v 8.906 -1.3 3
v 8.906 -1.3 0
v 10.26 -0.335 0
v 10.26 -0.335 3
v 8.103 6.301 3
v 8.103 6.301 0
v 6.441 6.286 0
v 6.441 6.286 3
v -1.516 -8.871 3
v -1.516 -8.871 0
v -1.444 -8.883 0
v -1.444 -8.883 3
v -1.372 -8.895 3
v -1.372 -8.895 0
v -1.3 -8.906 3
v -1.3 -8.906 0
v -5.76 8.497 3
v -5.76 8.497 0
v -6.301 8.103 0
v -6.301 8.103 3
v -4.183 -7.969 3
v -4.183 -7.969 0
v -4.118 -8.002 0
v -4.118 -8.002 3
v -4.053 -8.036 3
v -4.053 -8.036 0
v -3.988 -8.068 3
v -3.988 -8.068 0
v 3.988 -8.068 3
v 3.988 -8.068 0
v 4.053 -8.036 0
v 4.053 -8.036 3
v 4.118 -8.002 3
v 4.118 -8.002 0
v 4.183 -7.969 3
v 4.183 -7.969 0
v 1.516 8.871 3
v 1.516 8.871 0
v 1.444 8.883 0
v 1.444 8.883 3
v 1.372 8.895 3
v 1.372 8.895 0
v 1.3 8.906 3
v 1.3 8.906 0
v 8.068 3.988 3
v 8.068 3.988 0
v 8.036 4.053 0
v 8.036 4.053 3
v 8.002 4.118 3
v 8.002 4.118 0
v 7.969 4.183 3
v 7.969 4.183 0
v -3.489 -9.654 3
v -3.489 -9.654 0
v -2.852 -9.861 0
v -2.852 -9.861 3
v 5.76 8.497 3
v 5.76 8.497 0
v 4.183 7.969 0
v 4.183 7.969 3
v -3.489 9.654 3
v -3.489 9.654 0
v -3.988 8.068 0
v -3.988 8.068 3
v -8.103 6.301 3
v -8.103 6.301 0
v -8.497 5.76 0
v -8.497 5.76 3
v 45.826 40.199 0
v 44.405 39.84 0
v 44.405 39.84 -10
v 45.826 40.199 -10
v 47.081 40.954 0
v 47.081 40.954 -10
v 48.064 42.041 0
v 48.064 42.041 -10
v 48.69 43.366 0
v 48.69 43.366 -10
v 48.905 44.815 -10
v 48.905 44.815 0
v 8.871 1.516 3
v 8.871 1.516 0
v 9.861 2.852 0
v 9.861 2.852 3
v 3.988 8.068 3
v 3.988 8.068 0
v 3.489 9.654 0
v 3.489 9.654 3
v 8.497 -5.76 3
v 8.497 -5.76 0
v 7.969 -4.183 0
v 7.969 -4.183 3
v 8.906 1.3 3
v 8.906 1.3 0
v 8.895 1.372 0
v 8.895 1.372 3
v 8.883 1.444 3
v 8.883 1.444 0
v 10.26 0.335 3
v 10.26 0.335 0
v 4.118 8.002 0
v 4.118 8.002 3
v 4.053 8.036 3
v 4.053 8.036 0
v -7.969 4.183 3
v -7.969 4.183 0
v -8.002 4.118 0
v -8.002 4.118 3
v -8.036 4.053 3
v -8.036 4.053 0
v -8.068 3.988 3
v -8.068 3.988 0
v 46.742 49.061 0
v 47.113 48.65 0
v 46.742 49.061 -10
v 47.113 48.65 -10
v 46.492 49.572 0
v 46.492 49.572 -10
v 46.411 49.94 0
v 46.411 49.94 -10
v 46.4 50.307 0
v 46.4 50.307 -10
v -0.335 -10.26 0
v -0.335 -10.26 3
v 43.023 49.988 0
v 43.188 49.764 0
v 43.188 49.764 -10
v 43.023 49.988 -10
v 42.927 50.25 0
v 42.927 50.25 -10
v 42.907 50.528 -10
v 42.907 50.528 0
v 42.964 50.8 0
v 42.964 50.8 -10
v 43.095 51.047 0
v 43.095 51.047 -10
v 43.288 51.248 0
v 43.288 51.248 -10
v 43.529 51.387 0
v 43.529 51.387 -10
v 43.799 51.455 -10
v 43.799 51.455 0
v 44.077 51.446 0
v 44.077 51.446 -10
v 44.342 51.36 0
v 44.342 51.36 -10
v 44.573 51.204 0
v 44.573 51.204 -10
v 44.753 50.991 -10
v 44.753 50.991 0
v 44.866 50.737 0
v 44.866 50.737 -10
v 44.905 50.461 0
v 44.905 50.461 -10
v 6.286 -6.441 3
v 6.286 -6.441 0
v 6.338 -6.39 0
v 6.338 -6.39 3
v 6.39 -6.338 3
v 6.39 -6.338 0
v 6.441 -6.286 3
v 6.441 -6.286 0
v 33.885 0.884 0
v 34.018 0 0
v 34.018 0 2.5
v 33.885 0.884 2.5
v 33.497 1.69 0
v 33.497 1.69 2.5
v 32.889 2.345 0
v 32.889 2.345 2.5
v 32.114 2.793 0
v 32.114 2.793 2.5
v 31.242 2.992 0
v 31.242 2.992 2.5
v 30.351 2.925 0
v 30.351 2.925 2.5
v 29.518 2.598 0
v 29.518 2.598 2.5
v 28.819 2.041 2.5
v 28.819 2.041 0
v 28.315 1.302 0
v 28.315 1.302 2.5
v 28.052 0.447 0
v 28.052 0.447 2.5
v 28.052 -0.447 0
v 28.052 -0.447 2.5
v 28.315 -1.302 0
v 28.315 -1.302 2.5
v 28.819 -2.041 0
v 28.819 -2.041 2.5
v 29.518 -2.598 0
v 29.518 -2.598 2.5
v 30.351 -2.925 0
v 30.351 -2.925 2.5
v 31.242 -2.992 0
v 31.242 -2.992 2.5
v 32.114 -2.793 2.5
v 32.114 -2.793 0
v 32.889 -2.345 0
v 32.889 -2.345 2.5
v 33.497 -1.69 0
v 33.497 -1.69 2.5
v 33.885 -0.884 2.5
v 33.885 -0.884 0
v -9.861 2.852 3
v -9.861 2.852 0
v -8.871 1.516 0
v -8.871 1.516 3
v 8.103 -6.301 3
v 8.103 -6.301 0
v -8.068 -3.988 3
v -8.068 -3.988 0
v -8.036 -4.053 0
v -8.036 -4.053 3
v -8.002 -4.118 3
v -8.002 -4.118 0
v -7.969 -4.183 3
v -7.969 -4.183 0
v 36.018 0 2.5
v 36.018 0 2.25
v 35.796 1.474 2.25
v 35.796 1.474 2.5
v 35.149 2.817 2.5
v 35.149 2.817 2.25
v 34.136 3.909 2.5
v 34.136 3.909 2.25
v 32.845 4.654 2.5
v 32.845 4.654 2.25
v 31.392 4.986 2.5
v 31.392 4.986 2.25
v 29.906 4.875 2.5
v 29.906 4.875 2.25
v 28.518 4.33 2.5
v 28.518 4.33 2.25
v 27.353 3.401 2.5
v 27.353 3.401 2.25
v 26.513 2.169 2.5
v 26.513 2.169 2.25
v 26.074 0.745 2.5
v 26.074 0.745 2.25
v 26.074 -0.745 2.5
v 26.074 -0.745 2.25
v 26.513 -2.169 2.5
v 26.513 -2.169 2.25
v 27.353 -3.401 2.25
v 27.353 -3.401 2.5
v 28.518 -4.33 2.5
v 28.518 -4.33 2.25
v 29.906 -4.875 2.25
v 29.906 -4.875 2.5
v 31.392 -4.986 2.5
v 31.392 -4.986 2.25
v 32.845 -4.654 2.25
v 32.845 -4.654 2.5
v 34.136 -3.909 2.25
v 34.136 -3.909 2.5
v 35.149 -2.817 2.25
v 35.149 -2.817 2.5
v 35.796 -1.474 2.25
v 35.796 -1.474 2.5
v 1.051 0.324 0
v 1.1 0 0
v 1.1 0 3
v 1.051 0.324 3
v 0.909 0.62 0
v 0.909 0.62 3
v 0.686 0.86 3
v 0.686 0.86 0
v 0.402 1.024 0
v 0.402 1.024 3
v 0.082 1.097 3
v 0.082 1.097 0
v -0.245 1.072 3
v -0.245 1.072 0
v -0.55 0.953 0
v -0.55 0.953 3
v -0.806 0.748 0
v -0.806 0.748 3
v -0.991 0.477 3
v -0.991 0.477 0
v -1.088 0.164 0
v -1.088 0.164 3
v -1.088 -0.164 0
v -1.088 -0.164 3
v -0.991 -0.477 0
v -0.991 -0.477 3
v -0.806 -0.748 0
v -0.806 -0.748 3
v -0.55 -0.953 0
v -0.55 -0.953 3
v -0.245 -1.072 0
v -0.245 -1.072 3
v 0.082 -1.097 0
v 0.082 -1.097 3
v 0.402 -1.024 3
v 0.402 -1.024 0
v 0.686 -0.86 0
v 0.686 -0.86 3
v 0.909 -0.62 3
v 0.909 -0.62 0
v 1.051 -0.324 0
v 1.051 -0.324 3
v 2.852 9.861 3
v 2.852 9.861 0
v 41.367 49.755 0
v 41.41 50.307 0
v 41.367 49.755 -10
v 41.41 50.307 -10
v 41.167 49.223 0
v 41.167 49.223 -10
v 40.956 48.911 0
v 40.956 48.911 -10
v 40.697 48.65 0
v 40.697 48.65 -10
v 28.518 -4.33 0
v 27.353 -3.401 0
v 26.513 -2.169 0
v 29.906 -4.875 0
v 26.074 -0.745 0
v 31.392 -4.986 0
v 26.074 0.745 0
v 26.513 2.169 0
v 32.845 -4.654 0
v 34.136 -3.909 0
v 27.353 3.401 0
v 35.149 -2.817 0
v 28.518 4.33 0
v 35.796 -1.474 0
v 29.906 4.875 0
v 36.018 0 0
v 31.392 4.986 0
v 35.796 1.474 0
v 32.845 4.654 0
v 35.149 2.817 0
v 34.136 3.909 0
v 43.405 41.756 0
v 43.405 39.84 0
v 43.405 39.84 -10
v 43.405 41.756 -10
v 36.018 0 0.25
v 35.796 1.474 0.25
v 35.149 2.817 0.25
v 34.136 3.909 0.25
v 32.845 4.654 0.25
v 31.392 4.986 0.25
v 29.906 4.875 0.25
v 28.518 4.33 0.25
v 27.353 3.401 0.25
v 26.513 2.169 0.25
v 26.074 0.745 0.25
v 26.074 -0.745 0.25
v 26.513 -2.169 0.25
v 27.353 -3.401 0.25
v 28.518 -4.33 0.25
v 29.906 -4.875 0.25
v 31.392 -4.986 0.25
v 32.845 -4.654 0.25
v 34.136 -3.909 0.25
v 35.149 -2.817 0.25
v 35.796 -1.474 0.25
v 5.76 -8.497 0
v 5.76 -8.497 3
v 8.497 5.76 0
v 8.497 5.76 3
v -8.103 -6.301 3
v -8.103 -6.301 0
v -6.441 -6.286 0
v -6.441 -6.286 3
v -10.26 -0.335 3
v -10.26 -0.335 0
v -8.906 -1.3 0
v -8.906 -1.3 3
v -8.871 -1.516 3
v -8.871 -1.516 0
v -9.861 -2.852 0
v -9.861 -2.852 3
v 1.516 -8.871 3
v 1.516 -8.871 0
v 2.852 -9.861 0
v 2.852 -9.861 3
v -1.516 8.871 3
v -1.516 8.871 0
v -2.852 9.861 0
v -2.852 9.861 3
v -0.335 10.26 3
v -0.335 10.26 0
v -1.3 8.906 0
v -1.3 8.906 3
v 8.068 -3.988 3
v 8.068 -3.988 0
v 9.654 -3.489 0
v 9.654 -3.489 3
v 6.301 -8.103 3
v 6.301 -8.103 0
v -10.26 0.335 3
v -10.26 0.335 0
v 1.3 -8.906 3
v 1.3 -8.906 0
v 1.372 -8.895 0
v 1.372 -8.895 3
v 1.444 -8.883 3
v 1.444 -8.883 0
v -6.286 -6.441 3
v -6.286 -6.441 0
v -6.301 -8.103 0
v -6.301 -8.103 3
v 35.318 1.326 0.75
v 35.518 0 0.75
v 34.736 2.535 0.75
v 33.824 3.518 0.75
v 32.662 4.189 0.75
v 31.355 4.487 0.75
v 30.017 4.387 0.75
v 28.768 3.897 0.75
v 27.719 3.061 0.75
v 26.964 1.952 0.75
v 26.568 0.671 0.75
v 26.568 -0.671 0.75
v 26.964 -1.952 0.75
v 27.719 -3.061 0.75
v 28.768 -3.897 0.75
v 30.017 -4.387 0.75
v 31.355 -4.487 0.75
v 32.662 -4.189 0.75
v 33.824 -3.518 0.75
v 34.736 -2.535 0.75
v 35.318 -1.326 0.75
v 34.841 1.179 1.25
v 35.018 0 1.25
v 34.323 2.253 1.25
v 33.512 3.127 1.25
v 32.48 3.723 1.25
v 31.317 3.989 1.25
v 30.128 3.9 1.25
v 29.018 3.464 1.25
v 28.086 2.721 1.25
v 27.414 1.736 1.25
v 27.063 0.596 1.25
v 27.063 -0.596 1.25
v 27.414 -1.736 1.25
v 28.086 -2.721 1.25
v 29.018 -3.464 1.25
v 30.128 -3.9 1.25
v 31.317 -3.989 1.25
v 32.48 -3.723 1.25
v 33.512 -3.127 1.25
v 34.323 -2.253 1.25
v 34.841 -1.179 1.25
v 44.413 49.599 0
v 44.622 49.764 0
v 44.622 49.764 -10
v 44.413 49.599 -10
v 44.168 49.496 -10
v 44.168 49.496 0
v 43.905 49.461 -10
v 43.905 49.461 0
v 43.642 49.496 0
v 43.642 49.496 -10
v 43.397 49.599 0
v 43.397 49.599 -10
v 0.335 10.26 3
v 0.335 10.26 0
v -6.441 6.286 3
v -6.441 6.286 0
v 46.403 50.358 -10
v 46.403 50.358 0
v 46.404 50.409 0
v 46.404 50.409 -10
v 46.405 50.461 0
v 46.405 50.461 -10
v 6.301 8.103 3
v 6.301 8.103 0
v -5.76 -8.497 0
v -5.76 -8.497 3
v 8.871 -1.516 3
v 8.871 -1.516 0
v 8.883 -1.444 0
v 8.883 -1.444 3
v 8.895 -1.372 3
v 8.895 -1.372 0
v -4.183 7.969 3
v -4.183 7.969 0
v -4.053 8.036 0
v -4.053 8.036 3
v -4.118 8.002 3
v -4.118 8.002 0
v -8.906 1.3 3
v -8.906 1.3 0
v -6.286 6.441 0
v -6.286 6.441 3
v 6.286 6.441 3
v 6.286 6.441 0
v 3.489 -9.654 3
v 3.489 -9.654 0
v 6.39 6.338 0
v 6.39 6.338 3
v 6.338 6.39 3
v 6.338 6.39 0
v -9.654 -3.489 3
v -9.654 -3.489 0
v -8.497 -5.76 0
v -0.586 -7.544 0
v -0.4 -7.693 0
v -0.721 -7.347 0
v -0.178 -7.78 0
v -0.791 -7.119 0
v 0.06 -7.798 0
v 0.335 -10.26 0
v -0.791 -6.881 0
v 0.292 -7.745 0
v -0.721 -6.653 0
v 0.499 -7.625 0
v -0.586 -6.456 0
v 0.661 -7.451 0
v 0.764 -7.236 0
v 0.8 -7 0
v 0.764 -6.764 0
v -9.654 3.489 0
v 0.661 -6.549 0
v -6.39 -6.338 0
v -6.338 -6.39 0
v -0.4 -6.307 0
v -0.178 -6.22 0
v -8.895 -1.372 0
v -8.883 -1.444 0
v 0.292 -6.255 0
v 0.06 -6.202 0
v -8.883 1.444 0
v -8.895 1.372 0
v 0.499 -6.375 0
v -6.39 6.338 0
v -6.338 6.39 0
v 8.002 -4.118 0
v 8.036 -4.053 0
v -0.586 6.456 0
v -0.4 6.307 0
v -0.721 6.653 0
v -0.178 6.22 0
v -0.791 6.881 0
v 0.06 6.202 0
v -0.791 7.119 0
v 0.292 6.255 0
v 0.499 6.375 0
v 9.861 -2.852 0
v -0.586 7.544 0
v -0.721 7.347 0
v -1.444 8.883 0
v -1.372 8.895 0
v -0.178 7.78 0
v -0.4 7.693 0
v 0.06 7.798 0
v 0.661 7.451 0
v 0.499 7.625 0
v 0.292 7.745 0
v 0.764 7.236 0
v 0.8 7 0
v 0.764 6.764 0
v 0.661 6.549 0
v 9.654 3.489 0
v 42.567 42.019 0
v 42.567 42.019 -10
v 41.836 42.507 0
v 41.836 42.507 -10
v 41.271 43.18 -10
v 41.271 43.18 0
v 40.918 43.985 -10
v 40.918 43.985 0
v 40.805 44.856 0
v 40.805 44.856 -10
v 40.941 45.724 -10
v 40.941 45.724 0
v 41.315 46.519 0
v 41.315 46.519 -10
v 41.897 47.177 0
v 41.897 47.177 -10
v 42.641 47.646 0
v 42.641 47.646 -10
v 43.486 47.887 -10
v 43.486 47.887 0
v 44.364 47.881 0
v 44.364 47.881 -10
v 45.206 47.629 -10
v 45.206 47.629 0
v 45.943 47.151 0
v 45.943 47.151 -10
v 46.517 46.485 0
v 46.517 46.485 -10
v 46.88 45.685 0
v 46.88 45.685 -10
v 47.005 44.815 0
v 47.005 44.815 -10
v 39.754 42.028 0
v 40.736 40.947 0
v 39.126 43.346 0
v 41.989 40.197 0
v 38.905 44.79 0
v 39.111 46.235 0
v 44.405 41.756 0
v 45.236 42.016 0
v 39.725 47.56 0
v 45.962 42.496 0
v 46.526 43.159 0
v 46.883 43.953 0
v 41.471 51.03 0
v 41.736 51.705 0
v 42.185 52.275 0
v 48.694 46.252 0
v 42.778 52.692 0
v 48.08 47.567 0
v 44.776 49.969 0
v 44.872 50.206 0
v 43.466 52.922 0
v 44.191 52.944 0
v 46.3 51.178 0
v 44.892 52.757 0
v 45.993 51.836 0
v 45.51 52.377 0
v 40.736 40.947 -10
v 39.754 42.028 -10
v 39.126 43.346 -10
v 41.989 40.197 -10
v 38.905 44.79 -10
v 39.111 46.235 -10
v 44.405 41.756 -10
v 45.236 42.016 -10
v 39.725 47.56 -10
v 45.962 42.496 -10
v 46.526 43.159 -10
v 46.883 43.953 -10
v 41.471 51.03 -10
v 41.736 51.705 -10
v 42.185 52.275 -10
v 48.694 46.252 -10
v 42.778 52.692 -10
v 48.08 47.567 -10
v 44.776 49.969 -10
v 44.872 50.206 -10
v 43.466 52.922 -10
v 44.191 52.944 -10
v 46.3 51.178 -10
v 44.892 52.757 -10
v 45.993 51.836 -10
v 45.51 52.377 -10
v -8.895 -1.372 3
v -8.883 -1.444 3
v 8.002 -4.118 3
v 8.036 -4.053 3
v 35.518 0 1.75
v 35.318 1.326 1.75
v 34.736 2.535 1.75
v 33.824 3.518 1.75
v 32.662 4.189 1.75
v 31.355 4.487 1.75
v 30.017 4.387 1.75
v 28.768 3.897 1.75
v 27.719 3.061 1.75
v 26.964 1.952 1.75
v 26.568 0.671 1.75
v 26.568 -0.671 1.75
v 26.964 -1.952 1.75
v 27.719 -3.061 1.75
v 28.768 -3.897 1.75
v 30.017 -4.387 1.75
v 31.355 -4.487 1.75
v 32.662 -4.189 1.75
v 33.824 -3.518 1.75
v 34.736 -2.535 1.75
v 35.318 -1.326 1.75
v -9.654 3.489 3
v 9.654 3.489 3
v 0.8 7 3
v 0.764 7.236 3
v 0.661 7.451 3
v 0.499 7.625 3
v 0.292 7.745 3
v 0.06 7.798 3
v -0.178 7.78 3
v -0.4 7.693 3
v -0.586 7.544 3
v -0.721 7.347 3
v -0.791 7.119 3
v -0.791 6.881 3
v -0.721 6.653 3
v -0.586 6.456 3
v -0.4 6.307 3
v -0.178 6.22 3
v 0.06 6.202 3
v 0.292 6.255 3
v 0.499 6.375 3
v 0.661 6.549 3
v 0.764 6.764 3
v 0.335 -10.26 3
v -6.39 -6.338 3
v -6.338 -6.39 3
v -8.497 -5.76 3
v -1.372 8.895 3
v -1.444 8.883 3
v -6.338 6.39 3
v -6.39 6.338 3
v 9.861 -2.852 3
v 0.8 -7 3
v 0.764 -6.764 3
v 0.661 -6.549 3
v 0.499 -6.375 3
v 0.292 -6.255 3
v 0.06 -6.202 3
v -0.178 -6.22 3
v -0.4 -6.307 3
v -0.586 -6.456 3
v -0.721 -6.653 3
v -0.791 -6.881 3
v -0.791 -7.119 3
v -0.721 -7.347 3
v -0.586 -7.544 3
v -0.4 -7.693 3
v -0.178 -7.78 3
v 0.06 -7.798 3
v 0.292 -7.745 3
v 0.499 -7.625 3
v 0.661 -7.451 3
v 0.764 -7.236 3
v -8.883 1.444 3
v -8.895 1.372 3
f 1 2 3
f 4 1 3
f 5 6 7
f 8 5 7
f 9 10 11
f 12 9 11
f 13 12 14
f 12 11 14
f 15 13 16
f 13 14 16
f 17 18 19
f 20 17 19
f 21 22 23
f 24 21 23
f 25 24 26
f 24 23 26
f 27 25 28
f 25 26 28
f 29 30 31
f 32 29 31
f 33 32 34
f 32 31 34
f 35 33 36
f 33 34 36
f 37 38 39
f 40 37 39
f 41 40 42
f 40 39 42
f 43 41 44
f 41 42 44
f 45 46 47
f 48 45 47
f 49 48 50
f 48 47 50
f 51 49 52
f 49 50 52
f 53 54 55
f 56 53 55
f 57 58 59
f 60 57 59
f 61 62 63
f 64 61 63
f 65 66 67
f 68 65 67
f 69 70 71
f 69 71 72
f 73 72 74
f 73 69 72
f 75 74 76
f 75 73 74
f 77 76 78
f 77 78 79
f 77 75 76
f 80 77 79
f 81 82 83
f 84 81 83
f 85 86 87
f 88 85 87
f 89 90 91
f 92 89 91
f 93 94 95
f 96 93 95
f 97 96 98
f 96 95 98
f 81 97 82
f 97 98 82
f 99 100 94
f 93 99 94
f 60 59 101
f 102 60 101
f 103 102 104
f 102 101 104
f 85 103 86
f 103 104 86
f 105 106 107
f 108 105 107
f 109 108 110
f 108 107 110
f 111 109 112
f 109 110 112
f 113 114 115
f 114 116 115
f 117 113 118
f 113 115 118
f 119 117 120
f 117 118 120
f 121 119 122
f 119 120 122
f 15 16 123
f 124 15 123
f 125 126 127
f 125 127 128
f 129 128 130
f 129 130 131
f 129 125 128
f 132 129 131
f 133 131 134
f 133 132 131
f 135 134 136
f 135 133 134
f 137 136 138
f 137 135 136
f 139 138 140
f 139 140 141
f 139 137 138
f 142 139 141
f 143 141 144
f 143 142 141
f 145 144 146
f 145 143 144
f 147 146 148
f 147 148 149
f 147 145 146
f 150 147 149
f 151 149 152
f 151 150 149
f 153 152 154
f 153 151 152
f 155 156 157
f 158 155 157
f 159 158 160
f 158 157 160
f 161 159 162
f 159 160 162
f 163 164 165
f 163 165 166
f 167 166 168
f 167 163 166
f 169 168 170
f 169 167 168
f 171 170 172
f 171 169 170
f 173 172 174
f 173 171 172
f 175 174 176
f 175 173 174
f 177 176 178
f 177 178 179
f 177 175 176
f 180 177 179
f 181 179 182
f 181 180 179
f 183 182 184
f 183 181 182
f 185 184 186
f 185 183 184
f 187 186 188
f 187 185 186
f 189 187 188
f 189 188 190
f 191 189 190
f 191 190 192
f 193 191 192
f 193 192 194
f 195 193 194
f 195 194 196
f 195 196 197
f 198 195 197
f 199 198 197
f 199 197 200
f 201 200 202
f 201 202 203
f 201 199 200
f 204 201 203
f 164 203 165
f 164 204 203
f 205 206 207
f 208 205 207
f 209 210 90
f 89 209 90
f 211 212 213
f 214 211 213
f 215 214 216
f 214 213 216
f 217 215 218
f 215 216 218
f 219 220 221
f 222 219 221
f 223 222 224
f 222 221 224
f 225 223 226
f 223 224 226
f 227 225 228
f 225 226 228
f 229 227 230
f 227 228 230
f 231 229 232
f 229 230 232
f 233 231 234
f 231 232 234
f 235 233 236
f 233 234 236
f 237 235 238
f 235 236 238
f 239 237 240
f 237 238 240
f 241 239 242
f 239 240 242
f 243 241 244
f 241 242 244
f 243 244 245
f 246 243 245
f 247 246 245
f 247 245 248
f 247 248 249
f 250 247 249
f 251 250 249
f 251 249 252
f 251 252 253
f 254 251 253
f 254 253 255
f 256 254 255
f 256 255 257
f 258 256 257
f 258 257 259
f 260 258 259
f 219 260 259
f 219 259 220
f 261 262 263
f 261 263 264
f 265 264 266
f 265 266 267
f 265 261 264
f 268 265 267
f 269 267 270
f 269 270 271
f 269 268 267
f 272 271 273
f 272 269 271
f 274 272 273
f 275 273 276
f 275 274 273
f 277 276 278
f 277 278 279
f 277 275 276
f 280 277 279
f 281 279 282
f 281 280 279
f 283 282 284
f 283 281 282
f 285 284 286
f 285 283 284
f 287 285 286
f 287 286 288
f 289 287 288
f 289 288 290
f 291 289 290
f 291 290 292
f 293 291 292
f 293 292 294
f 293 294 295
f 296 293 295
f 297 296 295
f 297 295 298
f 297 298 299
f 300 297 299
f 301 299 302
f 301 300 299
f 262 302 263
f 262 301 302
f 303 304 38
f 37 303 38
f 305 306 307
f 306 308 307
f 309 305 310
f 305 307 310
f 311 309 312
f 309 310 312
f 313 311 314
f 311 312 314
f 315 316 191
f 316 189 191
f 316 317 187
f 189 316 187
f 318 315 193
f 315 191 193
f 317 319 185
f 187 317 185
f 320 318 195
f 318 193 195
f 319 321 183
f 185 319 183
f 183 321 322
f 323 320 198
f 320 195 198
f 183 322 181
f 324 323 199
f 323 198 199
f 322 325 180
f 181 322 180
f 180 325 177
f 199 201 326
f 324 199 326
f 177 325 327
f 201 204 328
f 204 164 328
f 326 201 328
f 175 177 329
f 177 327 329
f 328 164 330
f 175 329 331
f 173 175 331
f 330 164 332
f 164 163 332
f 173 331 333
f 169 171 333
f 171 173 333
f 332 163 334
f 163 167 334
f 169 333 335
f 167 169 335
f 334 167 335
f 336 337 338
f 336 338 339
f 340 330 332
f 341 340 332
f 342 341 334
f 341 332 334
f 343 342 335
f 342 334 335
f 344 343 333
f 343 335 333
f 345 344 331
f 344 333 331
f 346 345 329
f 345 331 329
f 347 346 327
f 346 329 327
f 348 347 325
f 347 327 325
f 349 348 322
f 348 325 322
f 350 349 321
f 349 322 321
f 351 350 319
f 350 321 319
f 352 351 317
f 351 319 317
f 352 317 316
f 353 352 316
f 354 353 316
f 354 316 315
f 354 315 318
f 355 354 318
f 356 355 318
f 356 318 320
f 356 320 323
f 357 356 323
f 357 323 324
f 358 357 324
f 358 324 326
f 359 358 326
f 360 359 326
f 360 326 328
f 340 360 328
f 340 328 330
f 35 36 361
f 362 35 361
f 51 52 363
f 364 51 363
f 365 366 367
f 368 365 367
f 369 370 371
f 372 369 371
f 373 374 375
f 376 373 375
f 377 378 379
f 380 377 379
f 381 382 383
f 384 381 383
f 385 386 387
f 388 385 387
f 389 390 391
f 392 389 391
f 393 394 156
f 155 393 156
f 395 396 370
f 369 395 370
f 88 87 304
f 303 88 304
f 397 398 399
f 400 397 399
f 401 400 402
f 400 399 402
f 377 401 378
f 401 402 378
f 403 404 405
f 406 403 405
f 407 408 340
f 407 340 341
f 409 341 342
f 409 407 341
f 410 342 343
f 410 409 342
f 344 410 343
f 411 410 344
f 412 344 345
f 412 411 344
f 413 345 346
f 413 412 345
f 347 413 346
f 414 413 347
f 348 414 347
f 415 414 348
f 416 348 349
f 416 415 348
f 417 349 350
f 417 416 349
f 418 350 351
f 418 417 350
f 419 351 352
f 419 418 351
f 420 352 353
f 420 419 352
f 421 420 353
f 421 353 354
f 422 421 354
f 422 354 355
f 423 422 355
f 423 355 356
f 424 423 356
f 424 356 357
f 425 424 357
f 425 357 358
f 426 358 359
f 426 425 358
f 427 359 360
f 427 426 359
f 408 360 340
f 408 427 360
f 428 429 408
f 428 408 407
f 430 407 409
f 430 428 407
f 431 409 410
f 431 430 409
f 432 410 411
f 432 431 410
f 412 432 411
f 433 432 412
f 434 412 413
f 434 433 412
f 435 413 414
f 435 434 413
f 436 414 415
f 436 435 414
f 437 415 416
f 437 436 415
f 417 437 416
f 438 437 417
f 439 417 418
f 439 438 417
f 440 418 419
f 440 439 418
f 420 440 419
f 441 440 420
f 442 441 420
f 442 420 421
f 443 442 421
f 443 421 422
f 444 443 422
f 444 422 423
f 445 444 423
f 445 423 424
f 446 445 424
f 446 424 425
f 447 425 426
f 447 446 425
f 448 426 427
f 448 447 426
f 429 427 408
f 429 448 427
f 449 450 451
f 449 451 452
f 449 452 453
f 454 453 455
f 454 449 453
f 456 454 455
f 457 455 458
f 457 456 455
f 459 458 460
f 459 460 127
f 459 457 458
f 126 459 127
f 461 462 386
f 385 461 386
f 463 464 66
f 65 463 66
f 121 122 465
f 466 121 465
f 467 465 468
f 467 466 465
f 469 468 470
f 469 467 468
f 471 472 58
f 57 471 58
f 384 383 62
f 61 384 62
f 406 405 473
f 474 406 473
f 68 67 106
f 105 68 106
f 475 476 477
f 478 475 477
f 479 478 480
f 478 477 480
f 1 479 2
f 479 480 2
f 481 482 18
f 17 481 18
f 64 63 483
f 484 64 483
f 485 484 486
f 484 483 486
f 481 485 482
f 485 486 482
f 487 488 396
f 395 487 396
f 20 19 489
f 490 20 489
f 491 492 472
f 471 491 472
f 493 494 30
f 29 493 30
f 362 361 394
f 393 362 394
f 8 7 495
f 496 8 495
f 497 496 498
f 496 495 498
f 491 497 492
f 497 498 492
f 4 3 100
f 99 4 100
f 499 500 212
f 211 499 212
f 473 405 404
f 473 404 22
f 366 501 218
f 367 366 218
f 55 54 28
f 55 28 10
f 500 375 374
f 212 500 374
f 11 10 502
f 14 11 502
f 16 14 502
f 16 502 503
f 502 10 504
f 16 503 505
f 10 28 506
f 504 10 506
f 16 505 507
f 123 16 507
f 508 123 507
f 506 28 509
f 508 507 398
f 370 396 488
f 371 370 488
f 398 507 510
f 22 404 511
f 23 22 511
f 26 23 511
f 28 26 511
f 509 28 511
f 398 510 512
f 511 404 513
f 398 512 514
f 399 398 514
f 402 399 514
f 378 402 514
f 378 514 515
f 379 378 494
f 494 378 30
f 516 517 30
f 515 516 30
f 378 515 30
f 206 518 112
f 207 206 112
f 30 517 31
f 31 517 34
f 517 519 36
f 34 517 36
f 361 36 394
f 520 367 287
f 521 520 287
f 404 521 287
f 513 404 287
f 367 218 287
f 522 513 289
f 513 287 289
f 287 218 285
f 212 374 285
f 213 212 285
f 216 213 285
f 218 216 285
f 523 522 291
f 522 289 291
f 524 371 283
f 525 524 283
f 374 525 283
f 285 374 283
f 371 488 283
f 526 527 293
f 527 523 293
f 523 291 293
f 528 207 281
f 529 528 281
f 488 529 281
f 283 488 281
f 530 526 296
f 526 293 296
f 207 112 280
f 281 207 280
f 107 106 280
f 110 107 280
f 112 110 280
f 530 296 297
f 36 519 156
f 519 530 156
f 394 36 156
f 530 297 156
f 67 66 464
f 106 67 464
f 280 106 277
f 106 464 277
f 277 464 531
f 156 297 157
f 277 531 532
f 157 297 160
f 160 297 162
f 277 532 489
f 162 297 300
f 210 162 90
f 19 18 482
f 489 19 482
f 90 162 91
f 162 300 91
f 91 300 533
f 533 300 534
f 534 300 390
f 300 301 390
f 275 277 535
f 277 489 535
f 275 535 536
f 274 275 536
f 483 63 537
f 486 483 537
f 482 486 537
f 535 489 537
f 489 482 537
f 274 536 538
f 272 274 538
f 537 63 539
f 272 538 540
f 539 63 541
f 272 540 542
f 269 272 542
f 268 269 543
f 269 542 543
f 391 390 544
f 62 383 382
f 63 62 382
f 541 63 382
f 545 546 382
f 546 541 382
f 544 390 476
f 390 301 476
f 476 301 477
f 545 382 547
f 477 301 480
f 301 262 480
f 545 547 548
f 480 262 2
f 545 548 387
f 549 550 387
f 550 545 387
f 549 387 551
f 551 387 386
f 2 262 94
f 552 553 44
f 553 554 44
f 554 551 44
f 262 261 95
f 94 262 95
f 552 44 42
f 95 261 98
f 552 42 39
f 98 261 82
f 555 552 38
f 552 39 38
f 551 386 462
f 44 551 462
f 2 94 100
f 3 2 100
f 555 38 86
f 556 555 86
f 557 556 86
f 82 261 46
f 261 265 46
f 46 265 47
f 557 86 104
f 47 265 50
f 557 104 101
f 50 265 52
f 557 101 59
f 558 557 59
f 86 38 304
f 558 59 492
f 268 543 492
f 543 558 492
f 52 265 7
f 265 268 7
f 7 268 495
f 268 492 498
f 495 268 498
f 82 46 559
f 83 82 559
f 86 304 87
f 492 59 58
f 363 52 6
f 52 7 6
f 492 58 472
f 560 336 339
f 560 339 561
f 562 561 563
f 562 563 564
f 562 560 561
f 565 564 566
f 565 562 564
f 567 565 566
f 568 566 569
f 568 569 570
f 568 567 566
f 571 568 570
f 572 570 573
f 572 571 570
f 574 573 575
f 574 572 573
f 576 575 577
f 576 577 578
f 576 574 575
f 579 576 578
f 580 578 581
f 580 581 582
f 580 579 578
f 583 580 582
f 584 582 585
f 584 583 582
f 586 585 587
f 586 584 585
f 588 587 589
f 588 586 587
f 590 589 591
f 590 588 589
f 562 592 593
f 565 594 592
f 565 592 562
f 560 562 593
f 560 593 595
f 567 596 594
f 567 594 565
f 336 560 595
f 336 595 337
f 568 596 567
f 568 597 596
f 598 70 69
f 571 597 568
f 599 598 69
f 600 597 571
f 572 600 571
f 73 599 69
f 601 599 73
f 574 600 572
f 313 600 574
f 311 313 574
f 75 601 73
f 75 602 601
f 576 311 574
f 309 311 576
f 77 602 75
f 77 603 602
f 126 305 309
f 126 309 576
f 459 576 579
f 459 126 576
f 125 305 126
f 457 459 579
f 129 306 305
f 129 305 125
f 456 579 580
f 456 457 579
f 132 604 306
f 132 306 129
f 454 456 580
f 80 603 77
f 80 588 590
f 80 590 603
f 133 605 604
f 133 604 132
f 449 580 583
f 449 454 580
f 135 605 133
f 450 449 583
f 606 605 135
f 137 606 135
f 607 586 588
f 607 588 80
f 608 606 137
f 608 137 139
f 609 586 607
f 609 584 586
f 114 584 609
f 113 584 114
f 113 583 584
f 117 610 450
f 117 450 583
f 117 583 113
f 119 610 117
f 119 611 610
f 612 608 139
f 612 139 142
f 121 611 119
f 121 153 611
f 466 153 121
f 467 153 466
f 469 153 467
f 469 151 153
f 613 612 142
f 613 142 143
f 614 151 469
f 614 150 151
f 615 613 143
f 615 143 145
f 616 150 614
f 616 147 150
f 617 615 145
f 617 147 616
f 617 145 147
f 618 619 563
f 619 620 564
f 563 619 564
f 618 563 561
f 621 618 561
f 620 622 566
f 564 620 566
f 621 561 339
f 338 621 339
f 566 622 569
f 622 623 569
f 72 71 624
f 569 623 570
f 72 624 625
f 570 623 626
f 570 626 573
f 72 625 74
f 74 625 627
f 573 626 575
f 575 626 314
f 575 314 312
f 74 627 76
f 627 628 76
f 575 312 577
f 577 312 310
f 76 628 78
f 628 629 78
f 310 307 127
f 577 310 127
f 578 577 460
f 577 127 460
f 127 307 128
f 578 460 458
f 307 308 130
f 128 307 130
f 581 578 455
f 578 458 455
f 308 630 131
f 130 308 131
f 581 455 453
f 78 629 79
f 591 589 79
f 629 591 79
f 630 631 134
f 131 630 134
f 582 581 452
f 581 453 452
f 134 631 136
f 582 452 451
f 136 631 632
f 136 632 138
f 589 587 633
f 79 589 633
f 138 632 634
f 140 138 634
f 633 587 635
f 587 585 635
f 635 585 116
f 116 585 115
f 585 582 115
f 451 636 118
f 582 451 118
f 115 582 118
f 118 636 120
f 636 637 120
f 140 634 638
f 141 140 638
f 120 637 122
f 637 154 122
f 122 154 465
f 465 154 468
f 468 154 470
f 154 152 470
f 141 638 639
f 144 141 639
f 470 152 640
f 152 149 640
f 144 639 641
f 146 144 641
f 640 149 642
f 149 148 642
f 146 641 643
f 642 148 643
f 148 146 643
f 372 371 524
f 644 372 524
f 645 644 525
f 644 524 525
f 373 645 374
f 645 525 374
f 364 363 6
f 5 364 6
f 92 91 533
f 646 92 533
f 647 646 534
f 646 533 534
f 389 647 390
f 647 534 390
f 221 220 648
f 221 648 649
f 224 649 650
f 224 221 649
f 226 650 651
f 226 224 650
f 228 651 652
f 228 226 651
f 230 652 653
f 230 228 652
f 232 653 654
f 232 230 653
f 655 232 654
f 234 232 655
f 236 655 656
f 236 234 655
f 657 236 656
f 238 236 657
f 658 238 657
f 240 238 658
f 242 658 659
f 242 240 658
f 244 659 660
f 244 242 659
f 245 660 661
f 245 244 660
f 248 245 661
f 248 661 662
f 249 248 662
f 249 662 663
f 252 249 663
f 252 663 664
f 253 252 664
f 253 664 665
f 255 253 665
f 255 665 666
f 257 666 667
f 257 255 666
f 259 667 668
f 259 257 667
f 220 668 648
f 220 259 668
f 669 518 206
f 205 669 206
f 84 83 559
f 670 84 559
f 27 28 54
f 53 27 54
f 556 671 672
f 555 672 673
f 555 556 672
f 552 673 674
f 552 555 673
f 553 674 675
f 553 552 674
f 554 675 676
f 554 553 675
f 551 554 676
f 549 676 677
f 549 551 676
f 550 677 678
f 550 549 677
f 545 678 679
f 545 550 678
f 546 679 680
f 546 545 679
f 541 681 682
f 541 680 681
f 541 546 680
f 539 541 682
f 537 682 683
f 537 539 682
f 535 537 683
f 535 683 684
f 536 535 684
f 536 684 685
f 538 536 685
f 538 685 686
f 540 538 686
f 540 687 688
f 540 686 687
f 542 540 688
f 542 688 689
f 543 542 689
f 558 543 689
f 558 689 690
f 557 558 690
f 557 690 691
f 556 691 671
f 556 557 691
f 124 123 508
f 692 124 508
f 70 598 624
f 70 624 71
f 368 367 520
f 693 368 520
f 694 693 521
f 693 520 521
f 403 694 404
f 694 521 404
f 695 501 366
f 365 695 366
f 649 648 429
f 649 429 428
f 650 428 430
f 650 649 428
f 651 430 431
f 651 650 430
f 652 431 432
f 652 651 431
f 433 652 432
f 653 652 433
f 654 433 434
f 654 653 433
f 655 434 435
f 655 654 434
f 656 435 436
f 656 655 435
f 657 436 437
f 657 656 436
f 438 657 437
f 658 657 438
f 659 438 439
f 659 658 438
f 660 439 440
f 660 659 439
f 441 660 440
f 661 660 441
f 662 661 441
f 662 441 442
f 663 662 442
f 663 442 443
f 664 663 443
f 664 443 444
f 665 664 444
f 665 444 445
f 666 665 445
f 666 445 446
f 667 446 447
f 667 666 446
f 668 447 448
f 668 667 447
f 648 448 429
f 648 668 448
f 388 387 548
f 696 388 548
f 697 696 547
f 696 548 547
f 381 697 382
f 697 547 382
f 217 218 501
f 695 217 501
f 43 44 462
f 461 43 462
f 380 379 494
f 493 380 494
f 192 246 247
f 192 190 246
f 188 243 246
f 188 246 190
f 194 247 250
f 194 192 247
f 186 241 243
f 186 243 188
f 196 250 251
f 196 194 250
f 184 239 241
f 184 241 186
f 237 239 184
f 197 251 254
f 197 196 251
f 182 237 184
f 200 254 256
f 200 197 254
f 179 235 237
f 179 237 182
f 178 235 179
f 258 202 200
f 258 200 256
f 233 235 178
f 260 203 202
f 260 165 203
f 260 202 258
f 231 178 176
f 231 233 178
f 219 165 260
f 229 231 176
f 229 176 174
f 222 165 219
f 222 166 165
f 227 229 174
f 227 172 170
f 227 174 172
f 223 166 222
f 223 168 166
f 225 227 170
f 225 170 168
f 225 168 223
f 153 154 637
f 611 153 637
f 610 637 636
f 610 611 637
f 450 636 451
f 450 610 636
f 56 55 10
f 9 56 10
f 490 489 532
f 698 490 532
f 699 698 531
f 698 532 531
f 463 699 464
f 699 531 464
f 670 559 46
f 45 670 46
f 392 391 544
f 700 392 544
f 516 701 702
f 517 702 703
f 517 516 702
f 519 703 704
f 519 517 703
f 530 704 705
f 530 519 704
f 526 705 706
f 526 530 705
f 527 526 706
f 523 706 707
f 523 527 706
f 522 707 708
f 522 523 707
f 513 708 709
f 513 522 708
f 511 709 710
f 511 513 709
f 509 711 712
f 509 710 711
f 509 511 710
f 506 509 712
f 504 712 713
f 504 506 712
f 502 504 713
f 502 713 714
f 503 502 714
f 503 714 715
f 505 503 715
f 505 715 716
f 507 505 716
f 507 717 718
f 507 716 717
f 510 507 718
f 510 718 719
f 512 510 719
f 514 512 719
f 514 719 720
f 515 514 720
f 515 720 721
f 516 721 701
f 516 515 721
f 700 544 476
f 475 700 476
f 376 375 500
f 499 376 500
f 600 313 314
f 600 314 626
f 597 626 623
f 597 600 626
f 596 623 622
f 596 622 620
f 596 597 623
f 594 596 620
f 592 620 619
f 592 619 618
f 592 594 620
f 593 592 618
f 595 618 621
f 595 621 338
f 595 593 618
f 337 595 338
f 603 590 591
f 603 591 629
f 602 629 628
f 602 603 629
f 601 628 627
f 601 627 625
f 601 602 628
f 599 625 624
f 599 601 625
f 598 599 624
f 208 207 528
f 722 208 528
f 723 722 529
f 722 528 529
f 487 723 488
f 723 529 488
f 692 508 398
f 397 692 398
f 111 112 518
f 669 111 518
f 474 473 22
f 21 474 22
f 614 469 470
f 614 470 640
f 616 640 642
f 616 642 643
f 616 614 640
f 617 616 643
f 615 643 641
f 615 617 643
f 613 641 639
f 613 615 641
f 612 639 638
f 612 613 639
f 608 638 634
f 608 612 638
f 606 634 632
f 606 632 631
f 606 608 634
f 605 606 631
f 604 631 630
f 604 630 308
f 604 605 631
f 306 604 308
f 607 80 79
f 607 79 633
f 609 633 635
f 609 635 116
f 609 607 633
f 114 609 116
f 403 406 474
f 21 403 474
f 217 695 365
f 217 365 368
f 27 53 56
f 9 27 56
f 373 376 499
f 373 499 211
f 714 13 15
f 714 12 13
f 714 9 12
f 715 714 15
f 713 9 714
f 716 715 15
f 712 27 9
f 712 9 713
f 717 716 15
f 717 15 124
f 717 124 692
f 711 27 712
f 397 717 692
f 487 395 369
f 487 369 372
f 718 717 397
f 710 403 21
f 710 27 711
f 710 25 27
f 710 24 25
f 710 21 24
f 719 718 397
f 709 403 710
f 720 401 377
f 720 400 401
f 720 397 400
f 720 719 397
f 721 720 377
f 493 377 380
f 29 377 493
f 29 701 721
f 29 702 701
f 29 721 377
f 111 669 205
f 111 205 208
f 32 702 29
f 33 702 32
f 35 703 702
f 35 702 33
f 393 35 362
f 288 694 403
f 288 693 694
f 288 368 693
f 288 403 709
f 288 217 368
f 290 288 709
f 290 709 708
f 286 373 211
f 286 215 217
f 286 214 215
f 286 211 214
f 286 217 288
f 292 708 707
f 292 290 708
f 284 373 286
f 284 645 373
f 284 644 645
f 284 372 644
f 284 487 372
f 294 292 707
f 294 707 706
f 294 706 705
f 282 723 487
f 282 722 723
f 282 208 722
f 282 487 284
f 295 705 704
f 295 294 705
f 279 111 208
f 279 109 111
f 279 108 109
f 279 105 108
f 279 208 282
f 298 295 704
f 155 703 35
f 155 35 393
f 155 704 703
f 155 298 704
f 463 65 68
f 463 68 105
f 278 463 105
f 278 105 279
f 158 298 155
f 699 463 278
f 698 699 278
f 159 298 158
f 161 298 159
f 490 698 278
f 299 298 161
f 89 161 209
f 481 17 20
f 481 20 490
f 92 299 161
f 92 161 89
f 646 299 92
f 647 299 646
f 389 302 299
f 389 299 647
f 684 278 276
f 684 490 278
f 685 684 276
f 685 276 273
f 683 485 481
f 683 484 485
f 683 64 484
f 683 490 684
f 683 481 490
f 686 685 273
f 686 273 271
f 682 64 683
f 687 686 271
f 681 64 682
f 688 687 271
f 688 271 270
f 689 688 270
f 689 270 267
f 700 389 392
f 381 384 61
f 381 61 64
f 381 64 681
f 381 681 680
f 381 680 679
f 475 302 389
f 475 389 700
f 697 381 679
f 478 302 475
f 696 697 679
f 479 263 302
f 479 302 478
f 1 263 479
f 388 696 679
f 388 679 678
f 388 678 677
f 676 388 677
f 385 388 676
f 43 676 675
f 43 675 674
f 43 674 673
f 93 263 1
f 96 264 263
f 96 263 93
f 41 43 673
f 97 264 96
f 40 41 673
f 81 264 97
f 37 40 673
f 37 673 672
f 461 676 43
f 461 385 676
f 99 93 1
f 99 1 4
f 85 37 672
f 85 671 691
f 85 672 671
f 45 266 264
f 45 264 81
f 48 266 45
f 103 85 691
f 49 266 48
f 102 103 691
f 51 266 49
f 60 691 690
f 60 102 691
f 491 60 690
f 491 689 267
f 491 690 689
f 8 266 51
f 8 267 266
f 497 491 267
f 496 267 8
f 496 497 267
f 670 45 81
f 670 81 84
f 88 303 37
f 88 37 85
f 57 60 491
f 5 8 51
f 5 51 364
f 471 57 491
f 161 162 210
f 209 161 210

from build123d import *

# Parameters (mm, degrees)
F0_R            = 9
F0_R_2          = 1.1
F1_DEPTH        = 3
F2_R            = 5
F2_R_2          = 3
F3_DEPTH        = 2.5
F5_DEPTH        = 3
F5_COPIES_COUNT = 20
F6_R            = 0.8
F7_DEPTH        = 25
F9_R            = 5
F9_R_2          = 4
F10_DEPTH       = 0.5
F11_SIZE        = 0.49999
F13_DEPTH       = 10
F14_R           = 2


# Not quite as in the source:
# - a fillet or chamfer is up to 0.001 mm smaller than in the source, because OpenCascade refuses the exact size
# - a pattern or mirror of a feature is missing from the dataset's text; its kind, count and spacing are read off the source's solid
# - a feature names something its author has since deleted; it is built from what else it names


with BuildPart() as f1:
    # F0 (on Top) → F1 (new body)
    with BuildSketch(Plane.XY):
        Circle(F0_R)
        Circle(F0_R_2, mode=Mode.SUBTRACT)
    extrude(amount=F1_DEPTH)

    # F4 (on Top) → F5 (join, through all)
    with BuildSketch(Plane.XY):
        with BuildLine():
            Line((1.2998515312, 8.905637877), (0.334630427, 10.2595795691))
            Line((0.334630427, 10.2595795691), (-0.334630427, 10.2595795691))
            Line((-0.334630427, 10.2595795691), (-1.2998515312, 8.905637877))
            ThreePointArc((-1.2998515312, 8.905637877), (0, 9), (1.2998515312, 8.905637877))
        make_face()
    f5 = extrude(amount=F5_DEPTH)

    # F5_copies: F5 ×20 about axis
    f5_copies_axis = Axis((0, 0, 0), (0, 0, 1))
    for i in range(1, F5_COPIES_COUNT):
        add(f5.rotate(f5_copies_axis, i * 360 / F5_COPIES_COUNT))

    # F6 (on Top) → F7 (cut)
    with BuildSketch(Plane.XY):
        with Locations((0, 7)):
            Circle(F6_R)
        with Locations((0, -7)):
            Circle(F6_R)
    extrude(amount=F7_DEPTH, mode=Mode.SUBTRACT)


with BuildPart() as f3:
    # F2 (on Top) → F3 (new body)
    with BuildSketch(Plane.XY):
        with Locations((31.0182180256, 0)):
            Circle(F2_R)
        with Locations((31.0182180256, 0)):
            Circle(F2_R_2, mode=Mode.SUBTRACT)
    extrude(amount=F3_DEPTH)

    # F9 (on mid) → F10 (cut, symmetric)
    with BuildSketch(Plane.XY.offset(1.25)):
        with Locations((31.0182180256, 0)):
            Circle(F9_R)
        with Locations((31.0182180256, 0)):
            Circle(F9_R_2, mode=Mode.SUBTRACT)
    extrude(amount=F10_DEPTH, both=True, mode=Mode.SUBTRACT)

    # F11 (size 0.5 in the source; OpenCascade refuses exactly that, so slightly less here)
    f11_edges = [f3.edges().sort_by_distance(p)[0] for p in [
        (26.018218, 0, 1.75),
        (27.018218, 0, 1.75),
        (26.018218, 0, 0.75),
        (27.018218, 0, 0.75),
    ]]
    chamfer(f11_edges, length=F11_SIZE)


with BuildPart() as f13:
    # F12 (on Top) → F13 (new body)
    with BuildSketch(Plane.XY):
        with BuildLine():
            ThreePointArc((44.6218451609, 49.7635806519), (43.9048883617, 49.4606982518), (43.1879315625, 49.7635806519))
            ThreePointArc((43.1879315625, 49.7635806519), (42.4213351165, 49.5900874785), (41.6913984575, 49.2986042608))
            ThreePointArc((41.6913984575, 49.2986042608), (43.9048883617, 47.9606982518), (46.1183782659, 49.2986042608))
            ThreePointArc((46.1183782659, 49.2986042608), (45.3884416069, 49.5900874785), (44.6218451609, 49.7635806519))
        make_face()
        with BuildLine():
            ThreePointArc((43.1879315625, 49.7635806519), (43.528694794, 51.3872393462), (44.9048883617, 50.4606982518))
            ThreePointArc((44.9048883617, 50.4606982518), (44.8314294561, 50.0845046841), (44.6218451609, 49.7635806519))
            ThreePointArc((44.6218451609, 49.7635806519), (45.3884416069, 49.5900874785), (46.1183782659, 49.2986042608))
            ThreePointArc((46.1183782659, 49.2986042608), (46.3322042415, 49.8622522478), (46.4048883617, 50.4606982518))
            ThreePointArc((46.4048883617, 50.4606982518), (43.3064423576, 52.8880141316), (41.6913984575, 49.2986042608))
            ThreePointArc((41.6913984575, 49.2986042608), (42.4213351165, 49.5900874785), (43.1879315625, 49.7635806519))
        make_face()
        with BuildLine():
            ThreePointArc((46.1183782659, 49.2986042608), (43.9048883617, 47.9606982518), (41.6913984575, 49.2986042608))
            ThreePointArc((41.6913984575, 49.2986042608), (38.9849722484, 43.9239448645), (43.4048883617, 39.8403131472))
            Line((43.4048883617, 39.8403131472), (43.4048883617, 41.7558386246))
            ThreePointArc((43.4048883617, 41.7558386246), (41.8974023717, 47.1774526949), (47.0048883617, 44.8152503327))
            ThreePointArc((47.0048883617, 44.8152503327), (46.2670907239, 42.8077643427), (44.4048883617, 41.7558386246))
            Line((44.4048883617, 41.7558386246), (44.4048883617, 39.8403131472))
            ThreePointArc((44.4048883617, 39.8403131472), (47.6129876052, 41.4611483665), (48.9048883617, 44.8152503327))
            ThreePointArc((48.9048883617, 44.8152503327), (48.15150169, 47.4546205681), (46.1183782659, 49.2986042608))
        make_face()
    extrude(amount=-F13_DEPTH)

    # F14
    f14_edges = [f13.edges().sort_by_distance(p)[0] for p in [
        (46.118378, 49.298604, -5),
        (41.691398, 49.298604, -5),
    ]]
    fillet(f14_edges, radius=F14_R)


solid = Compound([f1.part, f3.part, f13.part])
